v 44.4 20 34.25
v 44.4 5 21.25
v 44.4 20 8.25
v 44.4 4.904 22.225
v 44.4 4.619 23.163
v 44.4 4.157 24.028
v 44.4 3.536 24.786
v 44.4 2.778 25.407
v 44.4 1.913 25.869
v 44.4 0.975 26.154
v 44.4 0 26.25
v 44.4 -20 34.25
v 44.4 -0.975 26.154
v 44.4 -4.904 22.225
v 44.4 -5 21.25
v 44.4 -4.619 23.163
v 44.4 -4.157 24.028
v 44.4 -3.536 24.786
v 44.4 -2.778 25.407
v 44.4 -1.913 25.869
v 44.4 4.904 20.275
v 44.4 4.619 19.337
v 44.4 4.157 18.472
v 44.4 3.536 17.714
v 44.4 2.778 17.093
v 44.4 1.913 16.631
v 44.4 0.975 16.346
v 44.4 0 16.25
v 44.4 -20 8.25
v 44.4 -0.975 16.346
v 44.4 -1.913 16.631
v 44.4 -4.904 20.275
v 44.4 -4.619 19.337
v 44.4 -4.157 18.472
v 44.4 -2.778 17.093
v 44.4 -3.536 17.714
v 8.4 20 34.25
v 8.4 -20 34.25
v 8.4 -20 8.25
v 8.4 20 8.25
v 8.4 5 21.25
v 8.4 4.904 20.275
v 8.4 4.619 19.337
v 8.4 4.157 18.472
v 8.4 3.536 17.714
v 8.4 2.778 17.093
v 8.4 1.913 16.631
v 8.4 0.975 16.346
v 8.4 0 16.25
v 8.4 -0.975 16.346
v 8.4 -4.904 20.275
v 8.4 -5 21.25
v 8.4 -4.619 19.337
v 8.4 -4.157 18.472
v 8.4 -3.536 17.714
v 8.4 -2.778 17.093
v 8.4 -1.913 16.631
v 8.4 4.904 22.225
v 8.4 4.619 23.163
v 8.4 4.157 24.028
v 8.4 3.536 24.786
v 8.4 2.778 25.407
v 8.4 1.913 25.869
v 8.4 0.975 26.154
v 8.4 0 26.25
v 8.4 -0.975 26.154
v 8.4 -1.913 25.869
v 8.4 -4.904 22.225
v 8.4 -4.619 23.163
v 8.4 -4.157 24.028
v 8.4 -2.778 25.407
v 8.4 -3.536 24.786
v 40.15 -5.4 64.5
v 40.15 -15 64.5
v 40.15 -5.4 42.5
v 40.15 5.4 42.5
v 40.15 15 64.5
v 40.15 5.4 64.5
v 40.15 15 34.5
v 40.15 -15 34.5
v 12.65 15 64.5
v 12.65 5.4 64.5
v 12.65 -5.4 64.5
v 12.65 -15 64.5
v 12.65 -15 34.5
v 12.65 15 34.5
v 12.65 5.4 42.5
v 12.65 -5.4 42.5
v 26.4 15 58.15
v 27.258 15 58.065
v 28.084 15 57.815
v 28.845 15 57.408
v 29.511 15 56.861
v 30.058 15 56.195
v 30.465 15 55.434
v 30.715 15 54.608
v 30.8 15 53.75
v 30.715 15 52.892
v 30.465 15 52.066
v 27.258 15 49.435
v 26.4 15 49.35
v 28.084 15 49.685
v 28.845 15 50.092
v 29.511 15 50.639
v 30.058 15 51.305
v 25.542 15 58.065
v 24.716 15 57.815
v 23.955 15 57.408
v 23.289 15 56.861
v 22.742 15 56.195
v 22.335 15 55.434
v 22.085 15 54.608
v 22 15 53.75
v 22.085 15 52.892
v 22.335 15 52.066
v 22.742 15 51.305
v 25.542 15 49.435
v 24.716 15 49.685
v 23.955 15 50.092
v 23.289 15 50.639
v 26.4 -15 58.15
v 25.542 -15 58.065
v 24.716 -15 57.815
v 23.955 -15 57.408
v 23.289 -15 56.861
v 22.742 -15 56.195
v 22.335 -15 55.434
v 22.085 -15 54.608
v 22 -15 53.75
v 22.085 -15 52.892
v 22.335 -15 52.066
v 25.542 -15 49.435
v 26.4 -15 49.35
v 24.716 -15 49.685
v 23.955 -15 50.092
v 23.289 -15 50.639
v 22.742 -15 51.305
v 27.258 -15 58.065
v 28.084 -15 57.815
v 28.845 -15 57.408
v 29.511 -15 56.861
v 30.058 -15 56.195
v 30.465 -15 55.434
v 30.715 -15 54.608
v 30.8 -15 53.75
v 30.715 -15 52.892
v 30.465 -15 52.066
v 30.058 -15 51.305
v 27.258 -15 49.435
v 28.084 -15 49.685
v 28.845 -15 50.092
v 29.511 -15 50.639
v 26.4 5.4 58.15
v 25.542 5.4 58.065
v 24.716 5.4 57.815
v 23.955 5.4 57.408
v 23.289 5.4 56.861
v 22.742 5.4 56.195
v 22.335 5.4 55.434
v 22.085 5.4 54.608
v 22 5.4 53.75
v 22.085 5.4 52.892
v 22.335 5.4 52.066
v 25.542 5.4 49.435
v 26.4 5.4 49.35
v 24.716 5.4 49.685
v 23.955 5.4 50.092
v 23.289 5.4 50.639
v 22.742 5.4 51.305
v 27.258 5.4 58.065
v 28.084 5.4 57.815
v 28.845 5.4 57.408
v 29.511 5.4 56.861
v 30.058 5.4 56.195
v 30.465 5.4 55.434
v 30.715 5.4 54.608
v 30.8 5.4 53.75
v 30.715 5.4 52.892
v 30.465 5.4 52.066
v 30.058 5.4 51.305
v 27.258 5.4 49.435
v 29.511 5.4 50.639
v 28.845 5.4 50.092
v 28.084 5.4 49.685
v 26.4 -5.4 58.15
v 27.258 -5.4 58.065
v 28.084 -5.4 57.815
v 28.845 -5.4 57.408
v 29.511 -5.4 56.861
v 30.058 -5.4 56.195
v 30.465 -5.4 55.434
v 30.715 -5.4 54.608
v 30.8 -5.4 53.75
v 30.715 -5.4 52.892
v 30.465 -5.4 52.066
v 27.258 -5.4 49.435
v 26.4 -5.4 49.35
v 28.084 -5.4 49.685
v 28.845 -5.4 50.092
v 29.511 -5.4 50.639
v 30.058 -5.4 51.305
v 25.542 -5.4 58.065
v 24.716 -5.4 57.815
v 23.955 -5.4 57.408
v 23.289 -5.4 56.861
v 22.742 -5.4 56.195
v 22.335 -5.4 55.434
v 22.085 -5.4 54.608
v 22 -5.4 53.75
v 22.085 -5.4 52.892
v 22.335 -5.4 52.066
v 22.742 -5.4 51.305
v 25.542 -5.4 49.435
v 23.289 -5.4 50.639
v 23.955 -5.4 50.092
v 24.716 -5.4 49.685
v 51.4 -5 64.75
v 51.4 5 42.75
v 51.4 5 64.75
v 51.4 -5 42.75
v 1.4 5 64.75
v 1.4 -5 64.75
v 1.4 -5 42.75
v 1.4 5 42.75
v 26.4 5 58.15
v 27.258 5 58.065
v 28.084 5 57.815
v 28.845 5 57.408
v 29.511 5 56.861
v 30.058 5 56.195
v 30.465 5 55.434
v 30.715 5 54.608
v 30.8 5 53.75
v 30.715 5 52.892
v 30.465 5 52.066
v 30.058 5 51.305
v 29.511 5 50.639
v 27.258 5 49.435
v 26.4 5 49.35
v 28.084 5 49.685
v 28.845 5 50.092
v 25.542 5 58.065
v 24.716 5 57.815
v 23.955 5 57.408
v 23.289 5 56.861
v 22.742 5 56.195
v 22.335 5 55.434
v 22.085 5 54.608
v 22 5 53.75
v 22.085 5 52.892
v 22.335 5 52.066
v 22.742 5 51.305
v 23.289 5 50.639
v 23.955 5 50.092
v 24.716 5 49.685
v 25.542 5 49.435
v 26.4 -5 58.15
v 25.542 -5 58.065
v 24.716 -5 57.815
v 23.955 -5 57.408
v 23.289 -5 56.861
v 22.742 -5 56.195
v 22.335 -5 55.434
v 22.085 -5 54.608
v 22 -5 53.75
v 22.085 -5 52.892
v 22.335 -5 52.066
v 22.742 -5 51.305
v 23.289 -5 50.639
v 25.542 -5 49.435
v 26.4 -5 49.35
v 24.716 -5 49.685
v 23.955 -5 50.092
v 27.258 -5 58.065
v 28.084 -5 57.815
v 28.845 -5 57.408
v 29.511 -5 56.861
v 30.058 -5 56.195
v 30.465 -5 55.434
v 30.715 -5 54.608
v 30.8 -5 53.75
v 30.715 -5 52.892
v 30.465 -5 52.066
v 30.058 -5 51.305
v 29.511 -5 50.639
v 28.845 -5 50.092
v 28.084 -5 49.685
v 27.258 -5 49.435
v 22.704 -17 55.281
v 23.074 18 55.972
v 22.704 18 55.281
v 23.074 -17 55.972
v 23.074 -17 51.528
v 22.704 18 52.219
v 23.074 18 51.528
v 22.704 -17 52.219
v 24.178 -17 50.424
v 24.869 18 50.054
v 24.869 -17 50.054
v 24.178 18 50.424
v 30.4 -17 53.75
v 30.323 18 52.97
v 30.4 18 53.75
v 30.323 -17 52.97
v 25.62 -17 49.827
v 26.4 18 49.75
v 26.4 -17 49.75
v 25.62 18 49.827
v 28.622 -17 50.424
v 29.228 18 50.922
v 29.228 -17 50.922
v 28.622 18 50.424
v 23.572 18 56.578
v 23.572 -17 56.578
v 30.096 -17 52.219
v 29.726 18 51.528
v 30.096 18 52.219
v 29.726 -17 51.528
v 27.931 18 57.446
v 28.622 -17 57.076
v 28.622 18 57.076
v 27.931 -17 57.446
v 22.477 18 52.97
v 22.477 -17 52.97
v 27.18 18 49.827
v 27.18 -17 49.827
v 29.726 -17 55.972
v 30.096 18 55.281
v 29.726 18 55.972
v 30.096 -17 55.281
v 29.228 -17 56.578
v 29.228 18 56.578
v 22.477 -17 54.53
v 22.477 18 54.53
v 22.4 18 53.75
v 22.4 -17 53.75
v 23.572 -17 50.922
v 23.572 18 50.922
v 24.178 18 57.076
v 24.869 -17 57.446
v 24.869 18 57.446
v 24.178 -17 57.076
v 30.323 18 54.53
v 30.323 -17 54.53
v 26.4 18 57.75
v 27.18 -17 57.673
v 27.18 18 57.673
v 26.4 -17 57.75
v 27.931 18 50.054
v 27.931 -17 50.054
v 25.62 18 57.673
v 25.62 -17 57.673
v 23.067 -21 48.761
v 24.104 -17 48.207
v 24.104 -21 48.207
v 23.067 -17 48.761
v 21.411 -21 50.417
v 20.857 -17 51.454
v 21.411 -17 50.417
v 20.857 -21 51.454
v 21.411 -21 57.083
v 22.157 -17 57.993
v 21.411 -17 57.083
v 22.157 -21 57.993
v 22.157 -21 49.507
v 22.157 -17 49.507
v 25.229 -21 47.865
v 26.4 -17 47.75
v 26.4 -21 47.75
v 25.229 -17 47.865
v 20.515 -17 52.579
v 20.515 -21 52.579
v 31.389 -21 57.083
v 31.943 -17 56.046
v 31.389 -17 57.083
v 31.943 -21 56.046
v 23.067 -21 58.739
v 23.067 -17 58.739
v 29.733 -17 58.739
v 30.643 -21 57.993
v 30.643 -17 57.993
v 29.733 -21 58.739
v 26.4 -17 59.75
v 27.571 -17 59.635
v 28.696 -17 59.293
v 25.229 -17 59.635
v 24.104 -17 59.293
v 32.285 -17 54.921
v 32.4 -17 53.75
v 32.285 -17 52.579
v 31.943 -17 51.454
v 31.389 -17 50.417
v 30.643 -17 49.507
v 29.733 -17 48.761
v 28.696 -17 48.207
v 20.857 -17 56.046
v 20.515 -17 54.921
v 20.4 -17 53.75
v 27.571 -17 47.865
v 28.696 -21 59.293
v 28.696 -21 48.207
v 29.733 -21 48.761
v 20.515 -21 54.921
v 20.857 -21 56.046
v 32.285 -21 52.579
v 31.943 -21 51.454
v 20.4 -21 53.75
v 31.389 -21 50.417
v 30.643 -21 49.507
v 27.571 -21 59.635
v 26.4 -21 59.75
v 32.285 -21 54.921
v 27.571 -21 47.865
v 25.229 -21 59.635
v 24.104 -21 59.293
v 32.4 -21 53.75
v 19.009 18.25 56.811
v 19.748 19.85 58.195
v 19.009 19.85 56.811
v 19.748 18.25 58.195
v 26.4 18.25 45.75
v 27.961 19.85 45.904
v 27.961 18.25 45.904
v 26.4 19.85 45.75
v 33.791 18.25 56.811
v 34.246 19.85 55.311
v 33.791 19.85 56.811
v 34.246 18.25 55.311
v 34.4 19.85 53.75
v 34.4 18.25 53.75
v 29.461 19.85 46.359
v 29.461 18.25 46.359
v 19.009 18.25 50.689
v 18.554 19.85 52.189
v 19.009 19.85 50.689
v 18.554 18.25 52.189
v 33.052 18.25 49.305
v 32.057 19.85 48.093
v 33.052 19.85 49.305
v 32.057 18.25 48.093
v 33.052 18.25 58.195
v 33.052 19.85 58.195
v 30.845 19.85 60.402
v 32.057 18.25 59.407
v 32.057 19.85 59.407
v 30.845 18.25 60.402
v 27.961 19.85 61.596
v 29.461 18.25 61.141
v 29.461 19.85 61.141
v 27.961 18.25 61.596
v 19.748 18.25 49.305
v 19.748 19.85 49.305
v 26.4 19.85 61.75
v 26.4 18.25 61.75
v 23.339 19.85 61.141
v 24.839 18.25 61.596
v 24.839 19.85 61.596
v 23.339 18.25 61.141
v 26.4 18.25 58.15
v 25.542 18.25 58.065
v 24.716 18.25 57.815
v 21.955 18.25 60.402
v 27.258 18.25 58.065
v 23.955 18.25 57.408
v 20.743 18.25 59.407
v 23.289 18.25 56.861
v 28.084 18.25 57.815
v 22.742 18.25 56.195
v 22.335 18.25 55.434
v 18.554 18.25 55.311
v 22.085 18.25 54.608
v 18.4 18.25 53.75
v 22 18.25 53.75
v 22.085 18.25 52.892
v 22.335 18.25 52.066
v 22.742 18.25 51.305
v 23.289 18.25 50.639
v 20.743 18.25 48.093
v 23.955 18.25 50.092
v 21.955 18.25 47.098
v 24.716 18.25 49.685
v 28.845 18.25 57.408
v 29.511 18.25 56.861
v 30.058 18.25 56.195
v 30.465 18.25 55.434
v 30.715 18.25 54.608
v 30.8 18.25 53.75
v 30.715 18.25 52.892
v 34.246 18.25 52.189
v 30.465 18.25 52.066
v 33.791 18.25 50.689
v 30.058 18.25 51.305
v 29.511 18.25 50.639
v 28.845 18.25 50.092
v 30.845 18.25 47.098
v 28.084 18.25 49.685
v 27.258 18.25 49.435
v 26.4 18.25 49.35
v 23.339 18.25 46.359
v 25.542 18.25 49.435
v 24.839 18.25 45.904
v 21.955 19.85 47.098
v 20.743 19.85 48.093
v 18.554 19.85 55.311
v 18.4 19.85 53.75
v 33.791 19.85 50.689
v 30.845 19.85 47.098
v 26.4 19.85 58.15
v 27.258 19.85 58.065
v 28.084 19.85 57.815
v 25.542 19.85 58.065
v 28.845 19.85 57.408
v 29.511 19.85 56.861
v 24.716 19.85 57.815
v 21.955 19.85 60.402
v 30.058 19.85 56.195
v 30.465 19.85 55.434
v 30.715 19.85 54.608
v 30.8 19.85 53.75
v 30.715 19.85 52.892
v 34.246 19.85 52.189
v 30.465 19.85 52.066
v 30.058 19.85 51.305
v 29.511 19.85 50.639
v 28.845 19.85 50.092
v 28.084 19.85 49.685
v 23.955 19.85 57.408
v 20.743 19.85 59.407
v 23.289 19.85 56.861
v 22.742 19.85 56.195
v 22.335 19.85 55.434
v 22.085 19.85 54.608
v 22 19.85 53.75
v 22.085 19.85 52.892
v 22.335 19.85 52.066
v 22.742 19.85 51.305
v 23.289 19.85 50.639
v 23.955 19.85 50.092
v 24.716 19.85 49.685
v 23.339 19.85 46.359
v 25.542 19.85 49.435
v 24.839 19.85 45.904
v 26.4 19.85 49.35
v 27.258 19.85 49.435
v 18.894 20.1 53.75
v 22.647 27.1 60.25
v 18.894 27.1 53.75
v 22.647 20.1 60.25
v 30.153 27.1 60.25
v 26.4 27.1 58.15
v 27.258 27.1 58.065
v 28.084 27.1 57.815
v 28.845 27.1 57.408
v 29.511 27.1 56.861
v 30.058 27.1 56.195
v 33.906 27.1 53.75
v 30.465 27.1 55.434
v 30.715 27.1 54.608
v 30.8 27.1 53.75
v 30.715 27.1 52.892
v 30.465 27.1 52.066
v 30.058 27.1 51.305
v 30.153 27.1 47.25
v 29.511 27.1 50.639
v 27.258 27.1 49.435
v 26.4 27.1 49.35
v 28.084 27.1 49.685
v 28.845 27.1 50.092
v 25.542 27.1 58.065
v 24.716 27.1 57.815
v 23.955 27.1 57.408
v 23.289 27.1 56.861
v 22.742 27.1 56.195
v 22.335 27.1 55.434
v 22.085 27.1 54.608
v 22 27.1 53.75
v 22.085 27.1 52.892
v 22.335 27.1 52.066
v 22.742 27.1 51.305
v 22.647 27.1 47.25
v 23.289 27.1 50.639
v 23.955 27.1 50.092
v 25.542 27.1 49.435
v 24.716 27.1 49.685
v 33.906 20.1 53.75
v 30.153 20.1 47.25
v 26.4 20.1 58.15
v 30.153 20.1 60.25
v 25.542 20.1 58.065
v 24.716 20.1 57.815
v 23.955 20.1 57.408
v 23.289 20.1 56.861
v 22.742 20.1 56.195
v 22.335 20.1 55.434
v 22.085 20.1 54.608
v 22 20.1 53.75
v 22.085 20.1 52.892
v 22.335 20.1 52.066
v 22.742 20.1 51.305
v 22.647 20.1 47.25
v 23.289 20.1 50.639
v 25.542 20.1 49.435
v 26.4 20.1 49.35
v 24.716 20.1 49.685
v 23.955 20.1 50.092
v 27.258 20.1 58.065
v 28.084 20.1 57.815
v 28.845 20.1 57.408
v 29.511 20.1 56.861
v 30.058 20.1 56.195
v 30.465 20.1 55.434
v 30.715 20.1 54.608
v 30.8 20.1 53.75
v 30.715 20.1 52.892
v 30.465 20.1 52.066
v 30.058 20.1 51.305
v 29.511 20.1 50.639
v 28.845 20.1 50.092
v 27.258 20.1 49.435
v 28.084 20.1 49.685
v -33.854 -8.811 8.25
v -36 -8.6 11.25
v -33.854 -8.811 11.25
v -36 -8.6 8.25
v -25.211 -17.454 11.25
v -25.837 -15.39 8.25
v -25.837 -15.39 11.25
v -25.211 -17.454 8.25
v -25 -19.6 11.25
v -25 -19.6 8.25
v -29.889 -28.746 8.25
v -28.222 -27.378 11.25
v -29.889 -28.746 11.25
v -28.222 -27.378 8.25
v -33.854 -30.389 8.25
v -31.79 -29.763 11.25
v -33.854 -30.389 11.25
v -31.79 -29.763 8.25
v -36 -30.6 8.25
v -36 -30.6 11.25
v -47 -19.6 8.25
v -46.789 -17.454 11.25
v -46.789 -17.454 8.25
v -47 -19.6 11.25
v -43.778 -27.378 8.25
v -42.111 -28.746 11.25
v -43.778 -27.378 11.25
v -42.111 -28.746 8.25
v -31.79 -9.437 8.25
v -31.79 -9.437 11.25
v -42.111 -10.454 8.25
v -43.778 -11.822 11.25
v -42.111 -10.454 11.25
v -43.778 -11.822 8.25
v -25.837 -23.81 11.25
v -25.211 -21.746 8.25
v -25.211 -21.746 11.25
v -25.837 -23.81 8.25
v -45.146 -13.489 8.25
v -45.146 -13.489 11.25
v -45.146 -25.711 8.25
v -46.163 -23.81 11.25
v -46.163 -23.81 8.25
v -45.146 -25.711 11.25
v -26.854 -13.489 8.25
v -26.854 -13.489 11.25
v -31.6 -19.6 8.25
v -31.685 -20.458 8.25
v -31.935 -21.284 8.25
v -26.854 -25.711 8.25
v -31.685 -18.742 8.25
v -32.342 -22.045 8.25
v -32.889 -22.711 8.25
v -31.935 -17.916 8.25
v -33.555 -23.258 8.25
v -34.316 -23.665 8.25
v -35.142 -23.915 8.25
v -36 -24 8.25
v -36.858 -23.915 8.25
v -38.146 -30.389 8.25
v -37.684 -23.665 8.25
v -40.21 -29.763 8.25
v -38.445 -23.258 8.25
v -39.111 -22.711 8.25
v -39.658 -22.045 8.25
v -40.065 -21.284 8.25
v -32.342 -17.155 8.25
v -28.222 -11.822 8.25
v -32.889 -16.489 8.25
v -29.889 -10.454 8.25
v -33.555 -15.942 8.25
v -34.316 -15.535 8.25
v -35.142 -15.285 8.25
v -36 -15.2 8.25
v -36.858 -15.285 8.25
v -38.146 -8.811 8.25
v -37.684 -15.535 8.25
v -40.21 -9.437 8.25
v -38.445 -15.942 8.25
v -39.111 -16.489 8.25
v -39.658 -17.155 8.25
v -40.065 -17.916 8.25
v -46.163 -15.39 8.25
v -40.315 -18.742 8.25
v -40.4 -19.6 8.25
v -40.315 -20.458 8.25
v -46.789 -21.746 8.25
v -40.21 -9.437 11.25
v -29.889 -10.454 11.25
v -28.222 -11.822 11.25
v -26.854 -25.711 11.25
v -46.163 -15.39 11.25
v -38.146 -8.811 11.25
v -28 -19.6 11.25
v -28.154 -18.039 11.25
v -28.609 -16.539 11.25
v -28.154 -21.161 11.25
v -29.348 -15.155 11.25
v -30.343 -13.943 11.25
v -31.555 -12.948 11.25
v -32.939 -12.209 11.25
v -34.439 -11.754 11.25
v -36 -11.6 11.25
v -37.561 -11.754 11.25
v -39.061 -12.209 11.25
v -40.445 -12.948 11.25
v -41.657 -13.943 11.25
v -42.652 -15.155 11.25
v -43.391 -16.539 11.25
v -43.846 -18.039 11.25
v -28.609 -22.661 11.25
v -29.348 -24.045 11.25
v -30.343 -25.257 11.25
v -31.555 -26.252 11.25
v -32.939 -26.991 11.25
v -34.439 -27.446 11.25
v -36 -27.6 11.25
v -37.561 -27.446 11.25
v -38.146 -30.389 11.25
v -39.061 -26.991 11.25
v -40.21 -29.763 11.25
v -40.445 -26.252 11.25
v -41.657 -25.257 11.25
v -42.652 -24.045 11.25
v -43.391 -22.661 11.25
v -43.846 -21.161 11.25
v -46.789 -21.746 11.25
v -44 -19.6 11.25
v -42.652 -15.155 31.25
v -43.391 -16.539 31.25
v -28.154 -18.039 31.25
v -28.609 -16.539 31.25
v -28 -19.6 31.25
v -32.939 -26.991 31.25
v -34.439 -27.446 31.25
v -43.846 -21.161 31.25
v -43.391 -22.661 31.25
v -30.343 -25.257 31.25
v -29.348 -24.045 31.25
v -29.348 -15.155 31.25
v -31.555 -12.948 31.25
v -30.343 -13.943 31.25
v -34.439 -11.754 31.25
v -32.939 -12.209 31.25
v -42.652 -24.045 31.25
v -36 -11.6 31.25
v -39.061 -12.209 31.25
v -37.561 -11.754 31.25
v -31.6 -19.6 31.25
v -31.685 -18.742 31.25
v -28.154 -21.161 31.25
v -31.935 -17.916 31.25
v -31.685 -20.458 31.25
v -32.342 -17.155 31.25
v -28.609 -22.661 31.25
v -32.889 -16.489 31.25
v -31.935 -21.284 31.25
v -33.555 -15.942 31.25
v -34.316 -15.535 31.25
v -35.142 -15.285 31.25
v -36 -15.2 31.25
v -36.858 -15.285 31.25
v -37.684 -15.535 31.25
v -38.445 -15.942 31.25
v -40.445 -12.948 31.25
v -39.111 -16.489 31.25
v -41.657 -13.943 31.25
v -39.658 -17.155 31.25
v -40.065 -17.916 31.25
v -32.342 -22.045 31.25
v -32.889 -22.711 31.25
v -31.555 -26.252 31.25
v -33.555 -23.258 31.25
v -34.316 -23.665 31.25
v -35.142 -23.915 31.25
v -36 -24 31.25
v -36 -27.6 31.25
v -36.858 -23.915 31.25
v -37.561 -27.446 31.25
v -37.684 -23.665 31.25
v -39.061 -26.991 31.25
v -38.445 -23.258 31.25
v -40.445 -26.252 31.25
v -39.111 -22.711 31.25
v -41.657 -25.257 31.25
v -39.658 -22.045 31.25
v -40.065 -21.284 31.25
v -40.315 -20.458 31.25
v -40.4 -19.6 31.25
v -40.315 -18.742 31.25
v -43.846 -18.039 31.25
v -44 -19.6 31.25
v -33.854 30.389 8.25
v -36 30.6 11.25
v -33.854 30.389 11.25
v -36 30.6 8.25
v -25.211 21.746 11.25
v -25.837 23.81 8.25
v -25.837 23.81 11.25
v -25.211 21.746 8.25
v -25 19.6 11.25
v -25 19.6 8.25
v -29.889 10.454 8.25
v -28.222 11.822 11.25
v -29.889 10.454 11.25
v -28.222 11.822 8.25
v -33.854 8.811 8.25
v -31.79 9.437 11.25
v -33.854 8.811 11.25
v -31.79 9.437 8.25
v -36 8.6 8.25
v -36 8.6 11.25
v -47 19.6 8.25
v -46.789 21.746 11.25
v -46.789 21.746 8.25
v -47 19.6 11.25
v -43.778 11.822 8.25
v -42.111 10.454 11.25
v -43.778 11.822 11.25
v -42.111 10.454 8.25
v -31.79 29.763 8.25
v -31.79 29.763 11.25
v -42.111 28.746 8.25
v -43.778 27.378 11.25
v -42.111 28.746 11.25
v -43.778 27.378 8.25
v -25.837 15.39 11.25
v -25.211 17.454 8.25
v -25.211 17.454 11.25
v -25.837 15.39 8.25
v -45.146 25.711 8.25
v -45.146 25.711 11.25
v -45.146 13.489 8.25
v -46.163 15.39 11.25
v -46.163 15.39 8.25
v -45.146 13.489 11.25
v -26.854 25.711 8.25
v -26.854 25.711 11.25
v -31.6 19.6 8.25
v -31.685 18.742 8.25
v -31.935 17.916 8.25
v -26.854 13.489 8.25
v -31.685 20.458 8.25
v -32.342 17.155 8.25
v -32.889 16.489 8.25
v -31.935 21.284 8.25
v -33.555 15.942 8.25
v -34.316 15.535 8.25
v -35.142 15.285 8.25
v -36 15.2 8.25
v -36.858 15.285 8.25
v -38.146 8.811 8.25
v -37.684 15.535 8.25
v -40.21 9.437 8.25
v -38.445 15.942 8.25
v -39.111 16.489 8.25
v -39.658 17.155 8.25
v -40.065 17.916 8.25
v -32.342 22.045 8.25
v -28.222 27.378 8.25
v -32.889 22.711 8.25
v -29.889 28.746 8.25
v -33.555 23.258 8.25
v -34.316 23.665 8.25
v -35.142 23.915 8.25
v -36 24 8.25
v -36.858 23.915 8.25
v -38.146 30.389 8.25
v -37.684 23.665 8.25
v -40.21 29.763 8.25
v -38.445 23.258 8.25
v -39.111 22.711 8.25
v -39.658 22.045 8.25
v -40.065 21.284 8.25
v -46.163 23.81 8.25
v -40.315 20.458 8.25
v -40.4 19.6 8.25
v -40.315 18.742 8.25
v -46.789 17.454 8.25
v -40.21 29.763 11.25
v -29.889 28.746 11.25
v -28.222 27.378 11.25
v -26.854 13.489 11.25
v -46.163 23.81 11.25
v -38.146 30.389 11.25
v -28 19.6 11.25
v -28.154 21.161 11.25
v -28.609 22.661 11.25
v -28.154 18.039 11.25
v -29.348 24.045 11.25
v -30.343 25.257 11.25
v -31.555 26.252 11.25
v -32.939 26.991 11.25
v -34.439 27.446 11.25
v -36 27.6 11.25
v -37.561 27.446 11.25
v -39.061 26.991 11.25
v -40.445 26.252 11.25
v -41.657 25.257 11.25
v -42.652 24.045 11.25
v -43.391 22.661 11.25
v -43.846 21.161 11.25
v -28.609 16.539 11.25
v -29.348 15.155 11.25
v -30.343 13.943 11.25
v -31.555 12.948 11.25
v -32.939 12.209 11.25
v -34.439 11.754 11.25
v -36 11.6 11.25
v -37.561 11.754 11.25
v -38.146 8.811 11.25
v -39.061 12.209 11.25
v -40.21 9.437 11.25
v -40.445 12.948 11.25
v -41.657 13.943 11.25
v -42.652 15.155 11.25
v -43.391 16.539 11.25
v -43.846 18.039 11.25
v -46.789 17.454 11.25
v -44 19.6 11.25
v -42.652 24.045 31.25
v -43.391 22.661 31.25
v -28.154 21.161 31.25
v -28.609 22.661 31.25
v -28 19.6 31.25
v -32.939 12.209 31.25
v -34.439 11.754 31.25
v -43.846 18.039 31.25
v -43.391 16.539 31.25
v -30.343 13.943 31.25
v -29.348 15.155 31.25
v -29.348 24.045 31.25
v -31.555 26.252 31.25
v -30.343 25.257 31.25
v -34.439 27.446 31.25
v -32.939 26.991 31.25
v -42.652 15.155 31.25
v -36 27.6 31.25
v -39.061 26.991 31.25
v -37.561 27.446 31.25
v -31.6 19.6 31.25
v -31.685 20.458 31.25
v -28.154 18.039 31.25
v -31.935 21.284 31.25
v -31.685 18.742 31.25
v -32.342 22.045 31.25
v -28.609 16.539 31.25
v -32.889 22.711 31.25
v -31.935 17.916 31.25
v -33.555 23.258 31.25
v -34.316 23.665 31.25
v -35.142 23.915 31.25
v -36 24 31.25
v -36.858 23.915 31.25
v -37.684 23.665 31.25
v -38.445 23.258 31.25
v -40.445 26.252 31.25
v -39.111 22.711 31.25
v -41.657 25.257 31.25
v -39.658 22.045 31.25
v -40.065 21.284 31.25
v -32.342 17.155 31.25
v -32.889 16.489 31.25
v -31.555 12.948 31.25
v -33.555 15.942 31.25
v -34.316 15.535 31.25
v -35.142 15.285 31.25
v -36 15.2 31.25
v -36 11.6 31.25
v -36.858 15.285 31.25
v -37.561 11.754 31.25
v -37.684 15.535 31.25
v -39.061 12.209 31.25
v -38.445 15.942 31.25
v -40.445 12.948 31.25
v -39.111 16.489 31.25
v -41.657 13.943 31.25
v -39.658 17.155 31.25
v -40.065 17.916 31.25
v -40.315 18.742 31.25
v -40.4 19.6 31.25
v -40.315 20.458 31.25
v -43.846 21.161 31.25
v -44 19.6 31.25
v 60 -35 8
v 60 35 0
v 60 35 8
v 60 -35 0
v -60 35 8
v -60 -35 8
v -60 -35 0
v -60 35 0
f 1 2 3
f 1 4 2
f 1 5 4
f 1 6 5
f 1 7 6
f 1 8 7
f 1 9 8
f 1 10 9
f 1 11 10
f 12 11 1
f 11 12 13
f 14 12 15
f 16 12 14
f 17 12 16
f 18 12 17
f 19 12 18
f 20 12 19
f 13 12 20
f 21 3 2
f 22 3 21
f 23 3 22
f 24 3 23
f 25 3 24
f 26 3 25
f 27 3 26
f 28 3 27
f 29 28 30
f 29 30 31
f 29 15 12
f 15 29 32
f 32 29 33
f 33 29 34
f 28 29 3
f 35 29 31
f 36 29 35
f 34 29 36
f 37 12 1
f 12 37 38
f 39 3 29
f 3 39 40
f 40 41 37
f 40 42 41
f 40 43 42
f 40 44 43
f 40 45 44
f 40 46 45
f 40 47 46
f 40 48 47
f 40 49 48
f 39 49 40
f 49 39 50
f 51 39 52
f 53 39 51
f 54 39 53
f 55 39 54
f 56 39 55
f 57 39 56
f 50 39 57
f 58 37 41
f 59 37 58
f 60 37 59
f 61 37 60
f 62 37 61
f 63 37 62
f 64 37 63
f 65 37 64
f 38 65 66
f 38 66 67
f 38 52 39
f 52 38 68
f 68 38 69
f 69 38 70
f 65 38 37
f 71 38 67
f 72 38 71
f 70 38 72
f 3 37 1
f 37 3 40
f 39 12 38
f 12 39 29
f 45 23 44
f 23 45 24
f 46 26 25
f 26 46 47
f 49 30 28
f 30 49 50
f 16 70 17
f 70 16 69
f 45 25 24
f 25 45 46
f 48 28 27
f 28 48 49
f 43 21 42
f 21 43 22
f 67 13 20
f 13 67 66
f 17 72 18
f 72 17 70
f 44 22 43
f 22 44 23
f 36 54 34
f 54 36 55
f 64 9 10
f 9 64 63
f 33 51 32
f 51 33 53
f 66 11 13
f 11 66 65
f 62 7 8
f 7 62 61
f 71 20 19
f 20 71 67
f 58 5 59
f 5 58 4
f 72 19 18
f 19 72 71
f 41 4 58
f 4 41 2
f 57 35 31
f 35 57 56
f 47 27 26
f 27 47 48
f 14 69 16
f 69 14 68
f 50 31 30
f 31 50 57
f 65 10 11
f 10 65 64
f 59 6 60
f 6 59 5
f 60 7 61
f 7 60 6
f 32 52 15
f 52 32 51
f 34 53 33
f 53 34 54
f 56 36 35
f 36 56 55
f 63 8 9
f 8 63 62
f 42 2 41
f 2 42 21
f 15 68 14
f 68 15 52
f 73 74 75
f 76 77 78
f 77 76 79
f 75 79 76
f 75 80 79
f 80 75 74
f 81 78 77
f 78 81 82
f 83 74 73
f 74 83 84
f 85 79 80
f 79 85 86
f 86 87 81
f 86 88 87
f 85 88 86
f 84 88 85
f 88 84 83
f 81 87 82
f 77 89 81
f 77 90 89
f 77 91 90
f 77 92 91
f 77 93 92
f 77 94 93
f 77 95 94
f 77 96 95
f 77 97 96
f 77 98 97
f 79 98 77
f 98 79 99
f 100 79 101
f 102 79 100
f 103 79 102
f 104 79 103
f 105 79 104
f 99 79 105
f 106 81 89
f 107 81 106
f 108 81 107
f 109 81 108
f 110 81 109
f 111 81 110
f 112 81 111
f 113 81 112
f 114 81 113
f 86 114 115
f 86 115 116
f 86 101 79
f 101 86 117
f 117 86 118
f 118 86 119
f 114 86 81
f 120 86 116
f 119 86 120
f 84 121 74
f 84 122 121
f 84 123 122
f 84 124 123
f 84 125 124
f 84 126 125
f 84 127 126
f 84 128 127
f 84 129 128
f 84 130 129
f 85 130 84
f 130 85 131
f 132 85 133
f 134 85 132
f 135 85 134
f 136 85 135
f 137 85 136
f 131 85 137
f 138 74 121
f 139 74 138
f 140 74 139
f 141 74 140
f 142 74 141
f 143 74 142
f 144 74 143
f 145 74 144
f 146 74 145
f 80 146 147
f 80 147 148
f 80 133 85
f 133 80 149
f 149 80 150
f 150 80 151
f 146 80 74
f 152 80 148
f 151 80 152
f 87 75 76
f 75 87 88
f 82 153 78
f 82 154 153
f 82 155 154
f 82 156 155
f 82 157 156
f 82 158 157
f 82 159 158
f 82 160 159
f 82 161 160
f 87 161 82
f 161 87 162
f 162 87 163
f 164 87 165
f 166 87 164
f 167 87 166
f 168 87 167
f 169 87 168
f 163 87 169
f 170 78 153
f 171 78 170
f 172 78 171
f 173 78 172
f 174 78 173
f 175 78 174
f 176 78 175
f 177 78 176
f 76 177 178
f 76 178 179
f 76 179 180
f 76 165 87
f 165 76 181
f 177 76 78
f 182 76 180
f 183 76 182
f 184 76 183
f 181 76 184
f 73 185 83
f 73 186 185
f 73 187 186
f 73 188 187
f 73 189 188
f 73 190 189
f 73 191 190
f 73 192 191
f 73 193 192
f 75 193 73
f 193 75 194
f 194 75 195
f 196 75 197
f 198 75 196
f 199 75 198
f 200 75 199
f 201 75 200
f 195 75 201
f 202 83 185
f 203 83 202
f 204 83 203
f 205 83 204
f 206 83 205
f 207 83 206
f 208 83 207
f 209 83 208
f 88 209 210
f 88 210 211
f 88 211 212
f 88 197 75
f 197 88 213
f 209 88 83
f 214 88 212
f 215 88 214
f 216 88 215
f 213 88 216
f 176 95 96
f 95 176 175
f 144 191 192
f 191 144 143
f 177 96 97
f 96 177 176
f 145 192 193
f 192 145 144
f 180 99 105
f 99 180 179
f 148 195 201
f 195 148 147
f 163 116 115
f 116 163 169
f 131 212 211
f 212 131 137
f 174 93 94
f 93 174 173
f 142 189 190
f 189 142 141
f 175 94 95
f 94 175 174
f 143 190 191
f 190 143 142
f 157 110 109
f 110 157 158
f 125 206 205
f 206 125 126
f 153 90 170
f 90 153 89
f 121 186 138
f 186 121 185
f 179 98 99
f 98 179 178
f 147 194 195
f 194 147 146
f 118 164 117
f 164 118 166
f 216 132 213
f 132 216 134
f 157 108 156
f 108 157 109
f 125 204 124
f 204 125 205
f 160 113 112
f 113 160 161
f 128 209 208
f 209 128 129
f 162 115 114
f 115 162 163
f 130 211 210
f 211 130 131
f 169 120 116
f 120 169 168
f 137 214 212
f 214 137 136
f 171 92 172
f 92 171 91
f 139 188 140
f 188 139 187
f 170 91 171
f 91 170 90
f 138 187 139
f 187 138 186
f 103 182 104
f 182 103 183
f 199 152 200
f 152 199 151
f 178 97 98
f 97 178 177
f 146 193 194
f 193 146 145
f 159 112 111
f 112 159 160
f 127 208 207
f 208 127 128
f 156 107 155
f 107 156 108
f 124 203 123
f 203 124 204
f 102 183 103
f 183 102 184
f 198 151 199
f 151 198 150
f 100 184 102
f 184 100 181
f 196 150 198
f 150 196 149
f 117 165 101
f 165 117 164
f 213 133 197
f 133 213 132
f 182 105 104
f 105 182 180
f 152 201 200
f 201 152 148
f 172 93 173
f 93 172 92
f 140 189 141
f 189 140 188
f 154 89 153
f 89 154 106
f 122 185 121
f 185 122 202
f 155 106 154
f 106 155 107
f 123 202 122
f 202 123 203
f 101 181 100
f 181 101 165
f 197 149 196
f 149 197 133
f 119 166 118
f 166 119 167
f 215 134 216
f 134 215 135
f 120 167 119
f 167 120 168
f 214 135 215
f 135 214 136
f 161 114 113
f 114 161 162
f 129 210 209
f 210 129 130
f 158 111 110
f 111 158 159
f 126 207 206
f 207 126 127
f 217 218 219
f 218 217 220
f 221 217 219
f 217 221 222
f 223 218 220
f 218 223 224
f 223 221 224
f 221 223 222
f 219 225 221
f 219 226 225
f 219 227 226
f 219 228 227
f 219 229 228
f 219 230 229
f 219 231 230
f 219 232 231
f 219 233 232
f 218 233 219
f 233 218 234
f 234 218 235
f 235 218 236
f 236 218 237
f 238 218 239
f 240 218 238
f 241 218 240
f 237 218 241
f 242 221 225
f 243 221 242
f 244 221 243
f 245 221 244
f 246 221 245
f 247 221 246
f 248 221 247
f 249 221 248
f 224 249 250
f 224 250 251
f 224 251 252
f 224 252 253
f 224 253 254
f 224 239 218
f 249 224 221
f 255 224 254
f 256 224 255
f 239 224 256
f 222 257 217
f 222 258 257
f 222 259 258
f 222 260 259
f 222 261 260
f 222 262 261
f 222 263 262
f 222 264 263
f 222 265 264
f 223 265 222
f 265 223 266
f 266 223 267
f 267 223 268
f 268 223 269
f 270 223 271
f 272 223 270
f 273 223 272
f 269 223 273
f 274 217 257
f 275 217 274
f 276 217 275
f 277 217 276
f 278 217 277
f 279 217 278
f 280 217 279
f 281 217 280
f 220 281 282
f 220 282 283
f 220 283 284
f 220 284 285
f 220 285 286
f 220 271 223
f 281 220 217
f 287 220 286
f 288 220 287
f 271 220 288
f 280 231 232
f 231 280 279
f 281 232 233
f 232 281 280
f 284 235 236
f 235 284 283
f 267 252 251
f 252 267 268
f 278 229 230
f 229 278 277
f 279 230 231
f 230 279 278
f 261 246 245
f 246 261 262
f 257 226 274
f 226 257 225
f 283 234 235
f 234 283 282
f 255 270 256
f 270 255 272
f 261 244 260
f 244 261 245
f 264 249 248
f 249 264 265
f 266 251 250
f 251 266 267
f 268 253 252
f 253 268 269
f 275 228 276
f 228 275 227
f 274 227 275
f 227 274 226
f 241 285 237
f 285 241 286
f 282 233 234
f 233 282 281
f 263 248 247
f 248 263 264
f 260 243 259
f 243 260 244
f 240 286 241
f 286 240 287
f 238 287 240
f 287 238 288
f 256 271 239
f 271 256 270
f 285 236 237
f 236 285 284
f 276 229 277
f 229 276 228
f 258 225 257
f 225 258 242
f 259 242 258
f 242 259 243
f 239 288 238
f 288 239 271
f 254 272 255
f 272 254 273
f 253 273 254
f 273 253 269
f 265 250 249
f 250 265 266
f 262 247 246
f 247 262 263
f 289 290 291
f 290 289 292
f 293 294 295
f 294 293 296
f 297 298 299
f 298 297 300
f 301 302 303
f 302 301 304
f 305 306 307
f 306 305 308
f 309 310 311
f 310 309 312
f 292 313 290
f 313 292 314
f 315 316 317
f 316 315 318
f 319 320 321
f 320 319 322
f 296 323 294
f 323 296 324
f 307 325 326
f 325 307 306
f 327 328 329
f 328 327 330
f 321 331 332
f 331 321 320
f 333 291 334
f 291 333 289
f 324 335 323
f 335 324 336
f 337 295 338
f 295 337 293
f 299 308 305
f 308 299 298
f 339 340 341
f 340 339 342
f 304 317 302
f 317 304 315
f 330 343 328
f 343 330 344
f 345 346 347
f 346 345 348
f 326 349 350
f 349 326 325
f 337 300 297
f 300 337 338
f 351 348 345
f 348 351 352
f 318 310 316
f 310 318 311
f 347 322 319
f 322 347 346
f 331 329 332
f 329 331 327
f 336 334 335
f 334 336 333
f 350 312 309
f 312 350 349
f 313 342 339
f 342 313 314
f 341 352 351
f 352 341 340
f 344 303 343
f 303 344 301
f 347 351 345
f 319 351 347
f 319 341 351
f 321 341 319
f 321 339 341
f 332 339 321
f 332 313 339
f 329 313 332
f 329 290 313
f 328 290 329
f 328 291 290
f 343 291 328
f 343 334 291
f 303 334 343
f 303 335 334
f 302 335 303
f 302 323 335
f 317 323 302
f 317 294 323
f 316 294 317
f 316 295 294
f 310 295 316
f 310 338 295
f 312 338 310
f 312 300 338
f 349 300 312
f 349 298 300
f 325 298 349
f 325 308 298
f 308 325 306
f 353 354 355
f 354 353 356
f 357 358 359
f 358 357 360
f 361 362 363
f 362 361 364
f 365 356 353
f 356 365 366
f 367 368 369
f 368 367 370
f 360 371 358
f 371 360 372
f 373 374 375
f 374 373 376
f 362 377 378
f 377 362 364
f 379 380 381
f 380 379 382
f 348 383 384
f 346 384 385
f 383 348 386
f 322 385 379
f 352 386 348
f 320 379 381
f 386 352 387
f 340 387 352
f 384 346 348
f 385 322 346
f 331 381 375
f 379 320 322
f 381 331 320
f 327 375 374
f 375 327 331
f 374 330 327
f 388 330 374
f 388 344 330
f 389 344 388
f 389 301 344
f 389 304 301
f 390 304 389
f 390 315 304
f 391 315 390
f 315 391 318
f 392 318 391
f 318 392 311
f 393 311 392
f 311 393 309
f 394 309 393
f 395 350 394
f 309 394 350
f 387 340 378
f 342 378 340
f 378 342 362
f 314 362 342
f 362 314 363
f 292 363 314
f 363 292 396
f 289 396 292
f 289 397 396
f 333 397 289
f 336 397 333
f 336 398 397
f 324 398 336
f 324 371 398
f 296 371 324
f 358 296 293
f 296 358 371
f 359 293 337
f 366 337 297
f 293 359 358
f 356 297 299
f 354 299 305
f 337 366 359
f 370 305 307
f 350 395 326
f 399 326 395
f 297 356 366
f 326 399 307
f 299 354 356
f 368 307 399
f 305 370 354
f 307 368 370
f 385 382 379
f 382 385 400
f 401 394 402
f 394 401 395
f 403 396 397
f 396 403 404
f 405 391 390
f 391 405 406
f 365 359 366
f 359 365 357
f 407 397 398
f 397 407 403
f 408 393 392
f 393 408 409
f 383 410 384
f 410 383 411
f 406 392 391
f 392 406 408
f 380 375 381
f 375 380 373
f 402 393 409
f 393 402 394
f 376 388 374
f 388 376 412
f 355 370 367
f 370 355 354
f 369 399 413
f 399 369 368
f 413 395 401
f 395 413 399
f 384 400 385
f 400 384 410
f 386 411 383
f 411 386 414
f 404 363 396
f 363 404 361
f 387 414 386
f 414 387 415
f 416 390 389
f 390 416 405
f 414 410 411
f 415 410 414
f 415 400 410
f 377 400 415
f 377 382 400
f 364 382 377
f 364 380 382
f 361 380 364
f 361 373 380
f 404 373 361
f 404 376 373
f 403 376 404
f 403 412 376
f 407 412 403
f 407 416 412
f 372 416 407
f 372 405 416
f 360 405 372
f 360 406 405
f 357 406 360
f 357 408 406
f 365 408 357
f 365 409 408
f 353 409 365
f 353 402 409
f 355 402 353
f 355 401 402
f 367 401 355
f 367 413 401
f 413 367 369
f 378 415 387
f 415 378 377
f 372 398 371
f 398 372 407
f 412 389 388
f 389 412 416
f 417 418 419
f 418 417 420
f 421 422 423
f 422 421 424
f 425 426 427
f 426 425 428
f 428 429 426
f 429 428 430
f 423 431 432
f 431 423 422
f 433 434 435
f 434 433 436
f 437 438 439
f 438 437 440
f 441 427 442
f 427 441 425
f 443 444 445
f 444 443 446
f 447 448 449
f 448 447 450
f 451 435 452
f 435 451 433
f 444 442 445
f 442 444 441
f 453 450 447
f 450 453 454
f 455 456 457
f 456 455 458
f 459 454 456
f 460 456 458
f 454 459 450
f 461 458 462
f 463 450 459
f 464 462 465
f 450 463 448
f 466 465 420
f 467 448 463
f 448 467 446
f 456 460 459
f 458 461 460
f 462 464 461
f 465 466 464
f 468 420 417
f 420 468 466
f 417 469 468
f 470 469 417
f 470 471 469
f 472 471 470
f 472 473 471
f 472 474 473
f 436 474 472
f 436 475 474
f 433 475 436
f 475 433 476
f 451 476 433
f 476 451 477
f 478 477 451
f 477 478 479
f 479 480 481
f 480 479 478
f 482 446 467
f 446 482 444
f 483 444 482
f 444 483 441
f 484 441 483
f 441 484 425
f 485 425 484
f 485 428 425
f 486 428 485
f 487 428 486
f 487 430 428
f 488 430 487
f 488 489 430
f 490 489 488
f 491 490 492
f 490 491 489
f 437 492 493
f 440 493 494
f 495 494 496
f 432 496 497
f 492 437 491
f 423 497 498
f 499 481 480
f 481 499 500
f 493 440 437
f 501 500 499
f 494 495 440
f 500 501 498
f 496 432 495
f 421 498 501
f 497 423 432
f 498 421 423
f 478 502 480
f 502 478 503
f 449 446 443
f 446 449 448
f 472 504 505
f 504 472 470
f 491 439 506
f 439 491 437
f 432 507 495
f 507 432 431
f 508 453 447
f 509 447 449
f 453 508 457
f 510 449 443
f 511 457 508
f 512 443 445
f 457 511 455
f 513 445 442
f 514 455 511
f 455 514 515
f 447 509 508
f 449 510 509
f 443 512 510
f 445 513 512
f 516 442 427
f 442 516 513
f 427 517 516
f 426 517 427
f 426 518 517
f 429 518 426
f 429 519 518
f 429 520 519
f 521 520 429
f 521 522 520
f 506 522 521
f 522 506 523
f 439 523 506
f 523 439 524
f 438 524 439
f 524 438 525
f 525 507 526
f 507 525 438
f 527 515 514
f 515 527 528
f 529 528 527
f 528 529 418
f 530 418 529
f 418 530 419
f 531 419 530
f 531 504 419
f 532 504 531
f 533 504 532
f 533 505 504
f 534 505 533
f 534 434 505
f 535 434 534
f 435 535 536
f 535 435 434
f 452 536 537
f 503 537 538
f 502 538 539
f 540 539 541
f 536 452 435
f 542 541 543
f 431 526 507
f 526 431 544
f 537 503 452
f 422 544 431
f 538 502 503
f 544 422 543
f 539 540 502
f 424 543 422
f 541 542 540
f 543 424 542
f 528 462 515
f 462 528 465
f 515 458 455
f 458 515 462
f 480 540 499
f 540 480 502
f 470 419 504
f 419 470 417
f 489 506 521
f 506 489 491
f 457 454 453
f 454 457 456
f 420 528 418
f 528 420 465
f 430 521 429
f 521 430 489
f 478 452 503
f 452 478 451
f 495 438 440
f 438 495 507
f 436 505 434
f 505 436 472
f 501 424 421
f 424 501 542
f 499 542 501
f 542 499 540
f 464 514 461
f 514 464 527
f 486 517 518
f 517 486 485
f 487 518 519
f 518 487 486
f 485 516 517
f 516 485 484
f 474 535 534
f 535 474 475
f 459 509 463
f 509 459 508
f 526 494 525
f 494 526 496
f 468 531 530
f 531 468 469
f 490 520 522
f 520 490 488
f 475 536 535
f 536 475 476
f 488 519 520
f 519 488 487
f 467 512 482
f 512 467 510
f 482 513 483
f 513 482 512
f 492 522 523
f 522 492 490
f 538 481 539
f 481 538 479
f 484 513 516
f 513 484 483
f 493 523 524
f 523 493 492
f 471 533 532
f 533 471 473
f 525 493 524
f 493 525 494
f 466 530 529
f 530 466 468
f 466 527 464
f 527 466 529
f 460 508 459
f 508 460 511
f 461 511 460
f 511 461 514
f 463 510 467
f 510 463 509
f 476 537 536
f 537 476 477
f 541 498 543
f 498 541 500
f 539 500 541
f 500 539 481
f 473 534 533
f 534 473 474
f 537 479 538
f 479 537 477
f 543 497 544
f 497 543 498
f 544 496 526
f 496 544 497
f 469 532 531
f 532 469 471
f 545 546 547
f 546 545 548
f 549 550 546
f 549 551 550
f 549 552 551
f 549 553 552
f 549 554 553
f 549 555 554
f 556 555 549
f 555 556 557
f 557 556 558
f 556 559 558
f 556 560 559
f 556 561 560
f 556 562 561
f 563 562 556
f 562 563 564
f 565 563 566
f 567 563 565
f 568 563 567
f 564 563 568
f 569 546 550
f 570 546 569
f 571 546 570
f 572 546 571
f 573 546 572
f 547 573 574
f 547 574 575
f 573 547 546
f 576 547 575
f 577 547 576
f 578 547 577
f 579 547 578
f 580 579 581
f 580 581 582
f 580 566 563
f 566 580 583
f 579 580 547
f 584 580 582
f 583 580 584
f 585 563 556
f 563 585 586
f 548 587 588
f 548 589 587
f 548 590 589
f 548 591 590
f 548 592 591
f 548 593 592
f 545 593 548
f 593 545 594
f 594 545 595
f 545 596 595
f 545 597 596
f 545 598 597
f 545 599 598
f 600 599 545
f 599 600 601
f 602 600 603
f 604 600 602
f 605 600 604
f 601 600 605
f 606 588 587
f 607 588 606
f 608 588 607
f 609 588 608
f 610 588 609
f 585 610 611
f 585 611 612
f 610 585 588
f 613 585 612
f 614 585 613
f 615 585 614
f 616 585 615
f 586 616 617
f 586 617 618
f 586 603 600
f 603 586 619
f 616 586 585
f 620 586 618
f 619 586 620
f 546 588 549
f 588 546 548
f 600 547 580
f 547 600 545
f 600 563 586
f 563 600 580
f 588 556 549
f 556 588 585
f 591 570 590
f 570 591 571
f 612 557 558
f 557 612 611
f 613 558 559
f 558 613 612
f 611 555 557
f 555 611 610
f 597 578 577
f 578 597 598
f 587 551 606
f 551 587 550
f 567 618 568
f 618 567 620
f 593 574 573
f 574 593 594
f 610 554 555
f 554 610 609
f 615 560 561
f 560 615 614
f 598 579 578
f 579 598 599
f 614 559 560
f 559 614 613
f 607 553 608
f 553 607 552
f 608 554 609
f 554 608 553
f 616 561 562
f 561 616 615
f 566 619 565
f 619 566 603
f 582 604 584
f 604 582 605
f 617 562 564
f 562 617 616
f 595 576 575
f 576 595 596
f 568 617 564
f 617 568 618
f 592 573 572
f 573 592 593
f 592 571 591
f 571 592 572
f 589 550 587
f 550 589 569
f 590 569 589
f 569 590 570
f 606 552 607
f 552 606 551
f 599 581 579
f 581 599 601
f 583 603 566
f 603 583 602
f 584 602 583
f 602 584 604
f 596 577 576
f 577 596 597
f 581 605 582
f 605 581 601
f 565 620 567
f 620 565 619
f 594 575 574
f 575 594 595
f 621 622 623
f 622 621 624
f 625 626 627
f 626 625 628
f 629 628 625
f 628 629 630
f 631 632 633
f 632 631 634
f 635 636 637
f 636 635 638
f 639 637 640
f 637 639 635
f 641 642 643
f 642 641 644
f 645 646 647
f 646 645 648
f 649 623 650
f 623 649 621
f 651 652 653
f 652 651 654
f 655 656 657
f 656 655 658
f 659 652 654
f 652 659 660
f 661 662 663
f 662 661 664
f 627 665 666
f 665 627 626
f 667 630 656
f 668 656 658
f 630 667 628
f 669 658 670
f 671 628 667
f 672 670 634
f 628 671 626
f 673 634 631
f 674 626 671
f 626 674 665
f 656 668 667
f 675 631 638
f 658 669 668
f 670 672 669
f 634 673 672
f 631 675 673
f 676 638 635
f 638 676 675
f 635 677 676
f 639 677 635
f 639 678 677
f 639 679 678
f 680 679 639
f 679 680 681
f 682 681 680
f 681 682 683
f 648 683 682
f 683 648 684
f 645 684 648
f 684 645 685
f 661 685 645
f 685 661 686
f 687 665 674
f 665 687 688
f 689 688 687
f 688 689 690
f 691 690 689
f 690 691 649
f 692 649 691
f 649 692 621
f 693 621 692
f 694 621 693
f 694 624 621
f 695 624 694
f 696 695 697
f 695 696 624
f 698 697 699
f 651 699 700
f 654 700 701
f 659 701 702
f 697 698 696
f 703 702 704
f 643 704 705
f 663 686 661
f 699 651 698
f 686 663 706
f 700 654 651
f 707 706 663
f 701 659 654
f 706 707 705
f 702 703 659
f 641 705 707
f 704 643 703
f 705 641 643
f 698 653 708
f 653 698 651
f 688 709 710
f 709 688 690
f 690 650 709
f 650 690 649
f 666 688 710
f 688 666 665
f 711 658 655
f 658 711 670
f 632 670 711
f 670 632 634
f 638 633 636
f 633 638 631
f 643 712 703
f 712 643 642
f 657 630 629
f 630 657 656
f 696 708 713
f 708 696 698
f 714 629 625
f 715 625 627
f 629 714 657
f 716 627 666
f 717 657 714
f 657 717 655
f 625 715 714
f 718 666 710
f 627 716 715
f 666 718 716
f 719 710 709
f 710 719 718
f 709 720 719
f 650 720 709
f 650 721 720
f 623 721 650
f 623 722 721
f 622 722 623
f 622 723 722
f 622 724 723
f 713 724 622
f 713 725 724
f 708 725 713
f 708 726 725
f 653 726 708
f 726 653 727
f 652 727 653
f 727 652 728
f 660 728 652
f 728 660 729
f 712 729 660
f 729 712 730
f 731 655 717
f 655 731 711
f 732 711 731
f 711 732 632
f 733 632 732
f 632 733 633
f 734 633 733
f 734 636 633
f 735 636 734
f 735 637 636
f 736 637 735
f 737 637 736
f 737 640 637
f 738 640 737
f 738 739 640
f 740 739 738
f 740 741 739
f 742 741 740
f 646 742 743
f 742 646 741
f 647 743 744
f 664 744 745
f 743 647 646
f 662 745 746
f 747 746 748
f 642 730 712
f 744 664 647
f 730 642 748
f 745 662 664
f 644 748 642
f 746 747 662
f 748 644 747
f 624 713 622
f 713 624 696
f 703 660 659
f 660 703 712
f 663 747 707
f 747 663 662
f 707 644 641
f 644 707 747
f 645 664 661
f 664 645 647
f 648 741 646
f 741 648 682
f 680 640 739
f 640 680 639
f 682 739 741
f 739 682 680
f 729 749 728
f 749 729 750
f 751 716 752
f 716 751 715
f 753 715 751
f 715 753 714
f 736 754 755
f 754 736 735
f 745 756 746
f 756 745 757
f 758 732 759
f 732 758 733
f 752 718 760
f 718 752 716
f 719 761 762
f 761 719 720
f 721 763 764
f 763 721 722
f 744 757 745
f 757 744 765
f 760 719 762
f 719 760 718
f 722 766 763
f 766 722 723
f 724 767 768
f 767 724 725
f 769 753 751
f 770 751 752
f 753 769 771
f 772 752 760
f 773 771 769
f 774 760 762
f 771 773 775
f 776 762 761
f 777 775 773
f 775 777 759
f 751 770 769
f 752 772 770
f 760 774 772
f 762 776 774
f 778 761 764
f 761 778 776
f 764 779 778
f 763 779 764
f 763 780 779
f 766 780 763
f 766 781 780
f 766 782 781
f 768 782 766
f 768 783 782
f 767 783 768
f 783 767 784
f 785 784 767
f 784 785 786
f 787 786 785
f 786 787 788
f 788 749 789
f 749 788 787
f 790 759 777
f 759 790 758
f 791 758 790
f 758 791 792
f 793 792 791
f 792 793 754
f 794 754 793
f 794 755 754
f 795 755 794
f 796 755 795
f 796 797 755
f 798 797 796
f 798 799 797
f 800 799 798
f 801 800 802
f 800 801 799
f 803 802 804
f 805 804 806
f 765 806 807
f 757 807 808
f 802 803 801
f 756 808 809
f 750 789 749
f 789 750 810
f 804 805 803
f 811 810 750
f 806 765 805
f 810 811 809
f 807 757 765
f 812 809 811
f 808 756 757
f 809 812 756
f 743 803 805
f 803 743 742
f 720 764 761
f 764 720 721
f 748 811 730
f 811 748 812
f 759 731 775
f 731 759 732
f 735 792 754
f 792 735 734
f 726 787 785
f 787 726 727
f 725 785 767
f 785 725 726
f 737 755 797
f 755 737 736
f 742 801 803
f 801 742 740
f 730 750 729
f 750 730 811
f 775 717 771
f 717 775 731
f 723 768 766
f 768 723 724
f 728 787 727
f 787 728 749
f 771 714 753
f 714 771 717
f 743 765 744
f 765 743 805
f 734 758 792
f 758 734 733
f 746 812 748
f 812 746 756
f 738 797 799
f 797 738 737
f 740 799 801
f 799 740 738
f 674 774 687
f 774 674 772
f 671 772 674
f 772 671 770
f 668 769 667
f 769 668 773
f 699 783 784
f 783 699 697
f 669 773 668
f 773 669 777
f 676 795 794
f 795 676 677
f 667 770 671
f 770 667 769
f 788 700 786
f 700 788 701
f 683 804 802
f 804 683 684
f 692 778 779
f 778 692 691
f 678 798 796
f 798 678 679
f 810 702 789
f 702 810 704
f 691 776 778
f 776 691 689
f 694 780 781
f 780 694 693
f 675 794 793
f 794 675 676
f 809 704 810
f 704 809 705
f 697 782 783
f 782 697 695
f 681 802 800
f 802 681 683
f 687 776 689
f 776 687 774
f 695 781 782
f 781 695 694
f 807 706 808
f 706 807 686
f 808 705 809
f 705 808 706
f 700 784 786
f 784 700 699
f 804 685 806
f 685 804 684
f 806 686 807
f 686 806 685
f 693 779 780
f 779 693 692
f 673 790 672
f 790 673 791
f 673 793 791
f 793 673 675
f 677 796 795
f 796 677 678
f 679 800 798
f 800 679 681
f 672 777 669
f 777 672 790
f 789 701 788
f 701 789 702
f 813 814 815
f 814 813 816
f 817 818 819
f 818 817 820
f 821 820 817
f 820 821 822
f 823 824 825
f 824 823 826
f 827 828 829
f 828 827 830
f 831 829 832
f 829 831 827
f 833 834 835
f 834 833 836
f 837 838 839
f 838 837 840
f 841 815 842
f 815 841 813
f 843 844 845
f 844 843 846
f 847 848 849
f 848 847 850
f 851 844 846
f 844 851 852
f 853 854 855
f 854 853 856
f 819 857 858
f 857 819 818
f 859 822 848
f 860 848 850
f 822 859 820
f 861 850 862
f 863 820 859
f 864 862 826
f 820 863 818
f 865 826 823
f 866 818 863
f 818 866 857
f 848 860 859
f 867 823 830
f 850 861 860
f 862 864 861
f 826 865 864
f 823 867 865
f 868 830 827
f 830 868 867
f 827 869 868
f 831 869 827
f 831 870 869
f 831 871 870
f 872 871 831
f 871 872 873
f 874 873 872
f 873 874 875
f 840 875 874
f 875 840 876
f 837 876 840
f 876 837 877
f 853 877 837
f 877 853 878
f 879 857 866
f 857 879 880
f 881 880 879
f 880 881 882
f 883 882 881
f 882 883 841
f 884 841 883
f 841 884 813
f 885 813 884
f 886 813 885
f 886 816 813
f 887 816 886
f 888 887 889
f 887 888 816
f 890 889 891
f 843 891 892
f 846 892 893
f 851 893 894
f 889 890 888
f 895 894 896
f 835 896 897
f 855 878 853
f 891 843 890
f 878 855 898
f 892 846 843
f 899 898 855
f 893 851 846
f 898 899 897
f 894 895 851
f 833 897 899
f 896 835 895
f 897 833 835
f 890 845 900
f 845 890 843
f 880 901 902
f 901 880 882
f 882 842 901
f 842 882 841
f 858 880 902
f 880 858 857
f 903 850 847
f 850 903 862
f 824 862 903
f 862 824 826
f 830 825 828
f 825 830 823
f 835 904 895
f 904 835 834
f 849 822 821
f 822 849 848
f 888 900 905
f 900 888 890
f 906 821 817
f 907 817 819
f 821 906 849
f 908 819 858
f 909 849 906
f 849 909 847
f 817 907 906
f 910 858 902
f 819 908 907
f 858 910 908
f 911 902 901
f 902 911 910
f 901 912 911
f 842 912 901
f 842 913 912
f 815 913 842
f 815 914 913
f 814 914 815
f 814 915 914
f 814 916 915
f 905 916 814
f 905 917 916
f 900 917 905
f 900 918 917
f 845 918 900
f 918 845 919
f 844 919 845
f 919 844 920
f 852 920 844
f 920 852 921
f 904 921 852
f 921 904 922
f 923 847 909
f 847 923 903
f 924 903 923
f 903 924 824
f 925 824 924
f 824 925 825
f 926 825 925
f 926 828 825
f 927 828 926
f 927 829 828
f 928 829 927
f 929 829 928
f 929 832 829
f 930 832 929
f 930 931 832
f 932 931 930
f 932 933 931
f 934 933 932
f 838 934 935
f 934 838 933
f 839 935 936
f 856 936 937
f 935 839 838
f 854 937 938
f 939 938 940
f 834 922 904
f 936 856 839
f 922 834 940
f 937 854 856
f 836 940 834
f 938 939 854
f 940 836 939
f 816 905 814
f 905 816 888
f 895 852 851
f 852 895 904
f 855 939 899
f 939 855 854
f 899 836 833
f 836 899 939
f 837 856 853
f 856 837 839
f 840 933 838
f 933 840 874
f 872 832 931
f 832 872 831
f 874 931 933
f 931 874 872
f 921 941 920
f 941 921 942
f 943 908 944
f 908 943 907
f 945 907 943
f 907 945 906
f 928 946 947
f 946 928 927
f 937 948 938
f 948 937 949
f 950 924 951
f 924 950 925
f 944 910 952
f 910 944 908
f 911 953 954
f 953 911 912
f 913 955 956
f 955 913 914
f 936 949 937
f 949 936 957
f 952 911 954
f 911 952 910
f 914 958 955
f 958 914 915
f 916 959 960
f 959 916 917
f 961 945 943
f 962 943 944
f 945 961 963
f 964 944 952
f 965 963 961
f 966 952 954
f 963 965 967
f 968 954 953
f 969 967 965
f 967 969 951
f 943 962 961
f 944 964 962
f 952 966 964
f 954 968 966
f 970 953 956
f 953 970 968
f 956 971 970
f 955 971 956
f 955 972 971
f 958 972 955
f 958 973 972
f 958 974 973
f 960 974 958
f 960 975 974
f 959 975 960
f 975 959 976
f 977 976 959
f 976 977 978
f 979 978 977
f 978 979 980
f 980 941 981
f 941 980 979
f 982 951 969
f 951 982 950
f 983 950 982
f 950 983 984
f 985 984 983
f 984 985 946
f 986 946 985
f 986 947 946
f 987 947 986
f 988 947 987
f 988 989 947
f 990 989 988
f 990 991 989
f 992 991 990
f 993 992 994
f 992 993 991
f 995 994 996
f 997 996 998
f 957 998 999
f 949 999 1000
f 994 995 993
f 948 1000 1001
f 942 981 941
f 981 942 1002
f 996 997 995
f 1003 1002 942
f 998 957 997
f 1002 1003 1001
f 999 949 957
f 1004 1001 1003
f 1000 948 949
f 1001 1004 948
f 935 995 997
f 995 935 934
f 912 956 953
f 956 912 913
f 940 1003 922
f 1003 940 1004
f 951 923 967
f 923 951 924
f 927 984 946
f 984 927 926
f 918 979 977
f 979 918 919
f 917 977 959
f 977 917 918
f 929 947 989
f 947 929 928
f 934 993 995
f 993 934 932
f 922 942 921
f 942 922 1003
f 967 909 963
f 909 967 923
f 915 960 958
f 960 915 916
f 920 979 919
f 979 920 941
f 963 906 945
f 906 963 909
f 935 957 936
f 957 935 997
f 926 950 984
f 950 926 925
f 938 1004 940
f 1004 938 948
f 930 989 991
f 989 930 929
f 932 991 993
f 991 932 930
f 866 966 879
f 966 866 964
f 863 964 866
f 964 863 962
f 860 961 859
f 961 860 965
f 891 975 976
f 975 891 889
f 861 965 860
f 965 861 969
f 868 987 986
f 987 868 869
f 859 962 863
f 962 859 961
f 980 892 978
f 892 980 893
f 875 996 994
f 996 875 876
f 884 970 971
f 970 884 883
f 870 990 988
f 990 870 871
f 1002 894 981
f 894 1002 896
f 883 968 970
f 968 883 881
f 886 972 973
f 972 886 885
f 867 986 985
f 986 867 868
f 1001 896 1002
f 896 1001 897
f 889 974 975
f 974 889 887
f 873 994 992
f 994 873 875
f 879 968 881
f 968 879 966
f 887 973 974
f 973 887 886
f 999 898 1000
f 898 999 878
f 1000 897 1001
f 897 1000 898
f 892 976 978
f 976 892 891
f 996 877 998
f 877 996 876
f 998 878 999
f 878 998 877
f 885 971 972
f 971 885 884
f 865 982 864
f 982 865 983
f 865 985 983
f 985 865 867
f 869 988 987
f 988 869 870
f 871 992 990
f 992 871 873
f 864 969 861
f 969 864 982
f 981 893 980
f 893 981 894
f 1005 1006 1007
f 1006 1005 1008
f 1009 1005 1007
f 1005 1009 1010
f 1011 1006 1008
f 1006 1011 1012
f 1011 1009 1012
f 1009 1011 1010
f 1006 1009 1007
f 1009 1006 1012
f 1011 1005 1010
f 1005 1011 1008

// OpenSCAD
$fn = 32;

// ------------------------------------------------------------------------
// Indexing jig: plate 120 x 70 mm, pin d8
// Every part is its own module, assembly() places every instance.
// ------------------------------------------------------------------------

// --- part 1 ---
module jig_plate() {
  difference() {
    translate([-60, -35, 0]) cube([120, 70, 8]);
  }
}

// --- part 2 ---
module locator_block() {
  difference() {
    translate([-18, -20, 0]) cube([36, 40, 26]);
    translate([0, 0, 13]) rotate([0, 90, 0]) cylinder(h = 38, d = 10, center = true);
  }
}

// --- part 3 ---
module index_fork() {
  difference() {
    translate([-13.75, -15, 0]) cube([27.5, 30, 30]);
    translate([-14.75, -5.4, 8]) cube([29.5, 10.8, 23]);
    translate([0, 0, 19.25]) rotate([90, 0, 0]) cylinder(h = 32, d = 8.8, center = true);
  }
}

// --- part 4 ---
module index_arm() {
  difference() {
    translate([-25, -5, 0]) cube([50, 10, 22]);
    translate([0, 0, 11]) rotate([90, 0, 0]) cylinder(h = 12, d = 8.8, center = true);
  }
}

// --- part 5 ---
module index_pin() {
  rotate([0, 90, 0]) cylinder(h = 36, d = 8, center = true);
  translate([-21, 0, 0]) rotate([0, 90, 0]) cylinder(h = 4, d = 12);
}

// --- part 6 ---
module pin_washer() {
  difference() {
      translate([0, 0, 0]) cylinder(h = 1.6, d = 16);
      translate([0, 0, -1]) cylinder(h = 3.6, d = 8.8);
    }
}

// --- part 7 ---
module lock_nut() {
  difference() {
    linear_extrude(height = 7) polygon(points = [[7.506, 0], [3.753, 6.5], [-3.753, 6.5], [-7.506, 0], [-3.753, -6.5], [3.753, -6.5]]);
    translate([0, 0, -1]) cylinder(h = 9, d = 8.8);
  }
}

// --- part 8 ---
module guide_bush_a() {
  difference() {
    union() {
      cylinder(h = 3, d = 22);
      translate([0, 0, 3]) cylinder(h = 20, d = 16);
    }
    translate([0, 0, -1]) cylinder(h = 25, d = 8.8);
  }
}

// --- part 9 ---
module guide_bush_b() {
  difference() {
    union() {
      cylinder(h = 3, d = 22);
      translate([0, 0, 3]) cylinder(h = 20, d = 16);
    }
    translate([0, 0, -1]) cylinder(h = 25, d = 8.8);
  }
}

// --- assembly ---
module assembly() {
  color([0.80, 0.24, 0.20]) translate([0, 0, 0]) rotate([0, 0, 0]) jig_plate();
  color([0.20, 0.45, 0.75]) translate([26.4, 0, 8.25]) rotate([0, 0, 0]) locator_block();
  color([0.25, 0.62, 0.32]) translate([26.4, 0, 34.5]) rotate([0, 0, 0]) index_fork();
  color([0.92, 0.70, 0.18]) translate([26.4, 0, 42.75]) rotate([0, 0, 0]) index_arm();
  color([0.58, 0.35, 0.70]) translate([26.4, 0, 53.75]) rotate([0, 0, 90]) index_pin();
  color([0.16, 0.66, 0.66]) translate([26.4, 19.85, 53.75]) rotate([90, 0, 0]) pin_washer();
  color([0.85, 0.48, 0.18]) translate([26.4, 27.1, 53.75]) rotate([90, 0, 0]) lock_nut();
  color([0.55, 0.60, 0.65]) translate([-36, -19.6, 8.25]) rotate([0, 0, 0]) guide_bush_a();
  color([0.75, 0.30, 0.55]) translate([-36, 19.6, 8.25]) rotate([0, 0, 0]) guide_bush_b();
}

assembly();
